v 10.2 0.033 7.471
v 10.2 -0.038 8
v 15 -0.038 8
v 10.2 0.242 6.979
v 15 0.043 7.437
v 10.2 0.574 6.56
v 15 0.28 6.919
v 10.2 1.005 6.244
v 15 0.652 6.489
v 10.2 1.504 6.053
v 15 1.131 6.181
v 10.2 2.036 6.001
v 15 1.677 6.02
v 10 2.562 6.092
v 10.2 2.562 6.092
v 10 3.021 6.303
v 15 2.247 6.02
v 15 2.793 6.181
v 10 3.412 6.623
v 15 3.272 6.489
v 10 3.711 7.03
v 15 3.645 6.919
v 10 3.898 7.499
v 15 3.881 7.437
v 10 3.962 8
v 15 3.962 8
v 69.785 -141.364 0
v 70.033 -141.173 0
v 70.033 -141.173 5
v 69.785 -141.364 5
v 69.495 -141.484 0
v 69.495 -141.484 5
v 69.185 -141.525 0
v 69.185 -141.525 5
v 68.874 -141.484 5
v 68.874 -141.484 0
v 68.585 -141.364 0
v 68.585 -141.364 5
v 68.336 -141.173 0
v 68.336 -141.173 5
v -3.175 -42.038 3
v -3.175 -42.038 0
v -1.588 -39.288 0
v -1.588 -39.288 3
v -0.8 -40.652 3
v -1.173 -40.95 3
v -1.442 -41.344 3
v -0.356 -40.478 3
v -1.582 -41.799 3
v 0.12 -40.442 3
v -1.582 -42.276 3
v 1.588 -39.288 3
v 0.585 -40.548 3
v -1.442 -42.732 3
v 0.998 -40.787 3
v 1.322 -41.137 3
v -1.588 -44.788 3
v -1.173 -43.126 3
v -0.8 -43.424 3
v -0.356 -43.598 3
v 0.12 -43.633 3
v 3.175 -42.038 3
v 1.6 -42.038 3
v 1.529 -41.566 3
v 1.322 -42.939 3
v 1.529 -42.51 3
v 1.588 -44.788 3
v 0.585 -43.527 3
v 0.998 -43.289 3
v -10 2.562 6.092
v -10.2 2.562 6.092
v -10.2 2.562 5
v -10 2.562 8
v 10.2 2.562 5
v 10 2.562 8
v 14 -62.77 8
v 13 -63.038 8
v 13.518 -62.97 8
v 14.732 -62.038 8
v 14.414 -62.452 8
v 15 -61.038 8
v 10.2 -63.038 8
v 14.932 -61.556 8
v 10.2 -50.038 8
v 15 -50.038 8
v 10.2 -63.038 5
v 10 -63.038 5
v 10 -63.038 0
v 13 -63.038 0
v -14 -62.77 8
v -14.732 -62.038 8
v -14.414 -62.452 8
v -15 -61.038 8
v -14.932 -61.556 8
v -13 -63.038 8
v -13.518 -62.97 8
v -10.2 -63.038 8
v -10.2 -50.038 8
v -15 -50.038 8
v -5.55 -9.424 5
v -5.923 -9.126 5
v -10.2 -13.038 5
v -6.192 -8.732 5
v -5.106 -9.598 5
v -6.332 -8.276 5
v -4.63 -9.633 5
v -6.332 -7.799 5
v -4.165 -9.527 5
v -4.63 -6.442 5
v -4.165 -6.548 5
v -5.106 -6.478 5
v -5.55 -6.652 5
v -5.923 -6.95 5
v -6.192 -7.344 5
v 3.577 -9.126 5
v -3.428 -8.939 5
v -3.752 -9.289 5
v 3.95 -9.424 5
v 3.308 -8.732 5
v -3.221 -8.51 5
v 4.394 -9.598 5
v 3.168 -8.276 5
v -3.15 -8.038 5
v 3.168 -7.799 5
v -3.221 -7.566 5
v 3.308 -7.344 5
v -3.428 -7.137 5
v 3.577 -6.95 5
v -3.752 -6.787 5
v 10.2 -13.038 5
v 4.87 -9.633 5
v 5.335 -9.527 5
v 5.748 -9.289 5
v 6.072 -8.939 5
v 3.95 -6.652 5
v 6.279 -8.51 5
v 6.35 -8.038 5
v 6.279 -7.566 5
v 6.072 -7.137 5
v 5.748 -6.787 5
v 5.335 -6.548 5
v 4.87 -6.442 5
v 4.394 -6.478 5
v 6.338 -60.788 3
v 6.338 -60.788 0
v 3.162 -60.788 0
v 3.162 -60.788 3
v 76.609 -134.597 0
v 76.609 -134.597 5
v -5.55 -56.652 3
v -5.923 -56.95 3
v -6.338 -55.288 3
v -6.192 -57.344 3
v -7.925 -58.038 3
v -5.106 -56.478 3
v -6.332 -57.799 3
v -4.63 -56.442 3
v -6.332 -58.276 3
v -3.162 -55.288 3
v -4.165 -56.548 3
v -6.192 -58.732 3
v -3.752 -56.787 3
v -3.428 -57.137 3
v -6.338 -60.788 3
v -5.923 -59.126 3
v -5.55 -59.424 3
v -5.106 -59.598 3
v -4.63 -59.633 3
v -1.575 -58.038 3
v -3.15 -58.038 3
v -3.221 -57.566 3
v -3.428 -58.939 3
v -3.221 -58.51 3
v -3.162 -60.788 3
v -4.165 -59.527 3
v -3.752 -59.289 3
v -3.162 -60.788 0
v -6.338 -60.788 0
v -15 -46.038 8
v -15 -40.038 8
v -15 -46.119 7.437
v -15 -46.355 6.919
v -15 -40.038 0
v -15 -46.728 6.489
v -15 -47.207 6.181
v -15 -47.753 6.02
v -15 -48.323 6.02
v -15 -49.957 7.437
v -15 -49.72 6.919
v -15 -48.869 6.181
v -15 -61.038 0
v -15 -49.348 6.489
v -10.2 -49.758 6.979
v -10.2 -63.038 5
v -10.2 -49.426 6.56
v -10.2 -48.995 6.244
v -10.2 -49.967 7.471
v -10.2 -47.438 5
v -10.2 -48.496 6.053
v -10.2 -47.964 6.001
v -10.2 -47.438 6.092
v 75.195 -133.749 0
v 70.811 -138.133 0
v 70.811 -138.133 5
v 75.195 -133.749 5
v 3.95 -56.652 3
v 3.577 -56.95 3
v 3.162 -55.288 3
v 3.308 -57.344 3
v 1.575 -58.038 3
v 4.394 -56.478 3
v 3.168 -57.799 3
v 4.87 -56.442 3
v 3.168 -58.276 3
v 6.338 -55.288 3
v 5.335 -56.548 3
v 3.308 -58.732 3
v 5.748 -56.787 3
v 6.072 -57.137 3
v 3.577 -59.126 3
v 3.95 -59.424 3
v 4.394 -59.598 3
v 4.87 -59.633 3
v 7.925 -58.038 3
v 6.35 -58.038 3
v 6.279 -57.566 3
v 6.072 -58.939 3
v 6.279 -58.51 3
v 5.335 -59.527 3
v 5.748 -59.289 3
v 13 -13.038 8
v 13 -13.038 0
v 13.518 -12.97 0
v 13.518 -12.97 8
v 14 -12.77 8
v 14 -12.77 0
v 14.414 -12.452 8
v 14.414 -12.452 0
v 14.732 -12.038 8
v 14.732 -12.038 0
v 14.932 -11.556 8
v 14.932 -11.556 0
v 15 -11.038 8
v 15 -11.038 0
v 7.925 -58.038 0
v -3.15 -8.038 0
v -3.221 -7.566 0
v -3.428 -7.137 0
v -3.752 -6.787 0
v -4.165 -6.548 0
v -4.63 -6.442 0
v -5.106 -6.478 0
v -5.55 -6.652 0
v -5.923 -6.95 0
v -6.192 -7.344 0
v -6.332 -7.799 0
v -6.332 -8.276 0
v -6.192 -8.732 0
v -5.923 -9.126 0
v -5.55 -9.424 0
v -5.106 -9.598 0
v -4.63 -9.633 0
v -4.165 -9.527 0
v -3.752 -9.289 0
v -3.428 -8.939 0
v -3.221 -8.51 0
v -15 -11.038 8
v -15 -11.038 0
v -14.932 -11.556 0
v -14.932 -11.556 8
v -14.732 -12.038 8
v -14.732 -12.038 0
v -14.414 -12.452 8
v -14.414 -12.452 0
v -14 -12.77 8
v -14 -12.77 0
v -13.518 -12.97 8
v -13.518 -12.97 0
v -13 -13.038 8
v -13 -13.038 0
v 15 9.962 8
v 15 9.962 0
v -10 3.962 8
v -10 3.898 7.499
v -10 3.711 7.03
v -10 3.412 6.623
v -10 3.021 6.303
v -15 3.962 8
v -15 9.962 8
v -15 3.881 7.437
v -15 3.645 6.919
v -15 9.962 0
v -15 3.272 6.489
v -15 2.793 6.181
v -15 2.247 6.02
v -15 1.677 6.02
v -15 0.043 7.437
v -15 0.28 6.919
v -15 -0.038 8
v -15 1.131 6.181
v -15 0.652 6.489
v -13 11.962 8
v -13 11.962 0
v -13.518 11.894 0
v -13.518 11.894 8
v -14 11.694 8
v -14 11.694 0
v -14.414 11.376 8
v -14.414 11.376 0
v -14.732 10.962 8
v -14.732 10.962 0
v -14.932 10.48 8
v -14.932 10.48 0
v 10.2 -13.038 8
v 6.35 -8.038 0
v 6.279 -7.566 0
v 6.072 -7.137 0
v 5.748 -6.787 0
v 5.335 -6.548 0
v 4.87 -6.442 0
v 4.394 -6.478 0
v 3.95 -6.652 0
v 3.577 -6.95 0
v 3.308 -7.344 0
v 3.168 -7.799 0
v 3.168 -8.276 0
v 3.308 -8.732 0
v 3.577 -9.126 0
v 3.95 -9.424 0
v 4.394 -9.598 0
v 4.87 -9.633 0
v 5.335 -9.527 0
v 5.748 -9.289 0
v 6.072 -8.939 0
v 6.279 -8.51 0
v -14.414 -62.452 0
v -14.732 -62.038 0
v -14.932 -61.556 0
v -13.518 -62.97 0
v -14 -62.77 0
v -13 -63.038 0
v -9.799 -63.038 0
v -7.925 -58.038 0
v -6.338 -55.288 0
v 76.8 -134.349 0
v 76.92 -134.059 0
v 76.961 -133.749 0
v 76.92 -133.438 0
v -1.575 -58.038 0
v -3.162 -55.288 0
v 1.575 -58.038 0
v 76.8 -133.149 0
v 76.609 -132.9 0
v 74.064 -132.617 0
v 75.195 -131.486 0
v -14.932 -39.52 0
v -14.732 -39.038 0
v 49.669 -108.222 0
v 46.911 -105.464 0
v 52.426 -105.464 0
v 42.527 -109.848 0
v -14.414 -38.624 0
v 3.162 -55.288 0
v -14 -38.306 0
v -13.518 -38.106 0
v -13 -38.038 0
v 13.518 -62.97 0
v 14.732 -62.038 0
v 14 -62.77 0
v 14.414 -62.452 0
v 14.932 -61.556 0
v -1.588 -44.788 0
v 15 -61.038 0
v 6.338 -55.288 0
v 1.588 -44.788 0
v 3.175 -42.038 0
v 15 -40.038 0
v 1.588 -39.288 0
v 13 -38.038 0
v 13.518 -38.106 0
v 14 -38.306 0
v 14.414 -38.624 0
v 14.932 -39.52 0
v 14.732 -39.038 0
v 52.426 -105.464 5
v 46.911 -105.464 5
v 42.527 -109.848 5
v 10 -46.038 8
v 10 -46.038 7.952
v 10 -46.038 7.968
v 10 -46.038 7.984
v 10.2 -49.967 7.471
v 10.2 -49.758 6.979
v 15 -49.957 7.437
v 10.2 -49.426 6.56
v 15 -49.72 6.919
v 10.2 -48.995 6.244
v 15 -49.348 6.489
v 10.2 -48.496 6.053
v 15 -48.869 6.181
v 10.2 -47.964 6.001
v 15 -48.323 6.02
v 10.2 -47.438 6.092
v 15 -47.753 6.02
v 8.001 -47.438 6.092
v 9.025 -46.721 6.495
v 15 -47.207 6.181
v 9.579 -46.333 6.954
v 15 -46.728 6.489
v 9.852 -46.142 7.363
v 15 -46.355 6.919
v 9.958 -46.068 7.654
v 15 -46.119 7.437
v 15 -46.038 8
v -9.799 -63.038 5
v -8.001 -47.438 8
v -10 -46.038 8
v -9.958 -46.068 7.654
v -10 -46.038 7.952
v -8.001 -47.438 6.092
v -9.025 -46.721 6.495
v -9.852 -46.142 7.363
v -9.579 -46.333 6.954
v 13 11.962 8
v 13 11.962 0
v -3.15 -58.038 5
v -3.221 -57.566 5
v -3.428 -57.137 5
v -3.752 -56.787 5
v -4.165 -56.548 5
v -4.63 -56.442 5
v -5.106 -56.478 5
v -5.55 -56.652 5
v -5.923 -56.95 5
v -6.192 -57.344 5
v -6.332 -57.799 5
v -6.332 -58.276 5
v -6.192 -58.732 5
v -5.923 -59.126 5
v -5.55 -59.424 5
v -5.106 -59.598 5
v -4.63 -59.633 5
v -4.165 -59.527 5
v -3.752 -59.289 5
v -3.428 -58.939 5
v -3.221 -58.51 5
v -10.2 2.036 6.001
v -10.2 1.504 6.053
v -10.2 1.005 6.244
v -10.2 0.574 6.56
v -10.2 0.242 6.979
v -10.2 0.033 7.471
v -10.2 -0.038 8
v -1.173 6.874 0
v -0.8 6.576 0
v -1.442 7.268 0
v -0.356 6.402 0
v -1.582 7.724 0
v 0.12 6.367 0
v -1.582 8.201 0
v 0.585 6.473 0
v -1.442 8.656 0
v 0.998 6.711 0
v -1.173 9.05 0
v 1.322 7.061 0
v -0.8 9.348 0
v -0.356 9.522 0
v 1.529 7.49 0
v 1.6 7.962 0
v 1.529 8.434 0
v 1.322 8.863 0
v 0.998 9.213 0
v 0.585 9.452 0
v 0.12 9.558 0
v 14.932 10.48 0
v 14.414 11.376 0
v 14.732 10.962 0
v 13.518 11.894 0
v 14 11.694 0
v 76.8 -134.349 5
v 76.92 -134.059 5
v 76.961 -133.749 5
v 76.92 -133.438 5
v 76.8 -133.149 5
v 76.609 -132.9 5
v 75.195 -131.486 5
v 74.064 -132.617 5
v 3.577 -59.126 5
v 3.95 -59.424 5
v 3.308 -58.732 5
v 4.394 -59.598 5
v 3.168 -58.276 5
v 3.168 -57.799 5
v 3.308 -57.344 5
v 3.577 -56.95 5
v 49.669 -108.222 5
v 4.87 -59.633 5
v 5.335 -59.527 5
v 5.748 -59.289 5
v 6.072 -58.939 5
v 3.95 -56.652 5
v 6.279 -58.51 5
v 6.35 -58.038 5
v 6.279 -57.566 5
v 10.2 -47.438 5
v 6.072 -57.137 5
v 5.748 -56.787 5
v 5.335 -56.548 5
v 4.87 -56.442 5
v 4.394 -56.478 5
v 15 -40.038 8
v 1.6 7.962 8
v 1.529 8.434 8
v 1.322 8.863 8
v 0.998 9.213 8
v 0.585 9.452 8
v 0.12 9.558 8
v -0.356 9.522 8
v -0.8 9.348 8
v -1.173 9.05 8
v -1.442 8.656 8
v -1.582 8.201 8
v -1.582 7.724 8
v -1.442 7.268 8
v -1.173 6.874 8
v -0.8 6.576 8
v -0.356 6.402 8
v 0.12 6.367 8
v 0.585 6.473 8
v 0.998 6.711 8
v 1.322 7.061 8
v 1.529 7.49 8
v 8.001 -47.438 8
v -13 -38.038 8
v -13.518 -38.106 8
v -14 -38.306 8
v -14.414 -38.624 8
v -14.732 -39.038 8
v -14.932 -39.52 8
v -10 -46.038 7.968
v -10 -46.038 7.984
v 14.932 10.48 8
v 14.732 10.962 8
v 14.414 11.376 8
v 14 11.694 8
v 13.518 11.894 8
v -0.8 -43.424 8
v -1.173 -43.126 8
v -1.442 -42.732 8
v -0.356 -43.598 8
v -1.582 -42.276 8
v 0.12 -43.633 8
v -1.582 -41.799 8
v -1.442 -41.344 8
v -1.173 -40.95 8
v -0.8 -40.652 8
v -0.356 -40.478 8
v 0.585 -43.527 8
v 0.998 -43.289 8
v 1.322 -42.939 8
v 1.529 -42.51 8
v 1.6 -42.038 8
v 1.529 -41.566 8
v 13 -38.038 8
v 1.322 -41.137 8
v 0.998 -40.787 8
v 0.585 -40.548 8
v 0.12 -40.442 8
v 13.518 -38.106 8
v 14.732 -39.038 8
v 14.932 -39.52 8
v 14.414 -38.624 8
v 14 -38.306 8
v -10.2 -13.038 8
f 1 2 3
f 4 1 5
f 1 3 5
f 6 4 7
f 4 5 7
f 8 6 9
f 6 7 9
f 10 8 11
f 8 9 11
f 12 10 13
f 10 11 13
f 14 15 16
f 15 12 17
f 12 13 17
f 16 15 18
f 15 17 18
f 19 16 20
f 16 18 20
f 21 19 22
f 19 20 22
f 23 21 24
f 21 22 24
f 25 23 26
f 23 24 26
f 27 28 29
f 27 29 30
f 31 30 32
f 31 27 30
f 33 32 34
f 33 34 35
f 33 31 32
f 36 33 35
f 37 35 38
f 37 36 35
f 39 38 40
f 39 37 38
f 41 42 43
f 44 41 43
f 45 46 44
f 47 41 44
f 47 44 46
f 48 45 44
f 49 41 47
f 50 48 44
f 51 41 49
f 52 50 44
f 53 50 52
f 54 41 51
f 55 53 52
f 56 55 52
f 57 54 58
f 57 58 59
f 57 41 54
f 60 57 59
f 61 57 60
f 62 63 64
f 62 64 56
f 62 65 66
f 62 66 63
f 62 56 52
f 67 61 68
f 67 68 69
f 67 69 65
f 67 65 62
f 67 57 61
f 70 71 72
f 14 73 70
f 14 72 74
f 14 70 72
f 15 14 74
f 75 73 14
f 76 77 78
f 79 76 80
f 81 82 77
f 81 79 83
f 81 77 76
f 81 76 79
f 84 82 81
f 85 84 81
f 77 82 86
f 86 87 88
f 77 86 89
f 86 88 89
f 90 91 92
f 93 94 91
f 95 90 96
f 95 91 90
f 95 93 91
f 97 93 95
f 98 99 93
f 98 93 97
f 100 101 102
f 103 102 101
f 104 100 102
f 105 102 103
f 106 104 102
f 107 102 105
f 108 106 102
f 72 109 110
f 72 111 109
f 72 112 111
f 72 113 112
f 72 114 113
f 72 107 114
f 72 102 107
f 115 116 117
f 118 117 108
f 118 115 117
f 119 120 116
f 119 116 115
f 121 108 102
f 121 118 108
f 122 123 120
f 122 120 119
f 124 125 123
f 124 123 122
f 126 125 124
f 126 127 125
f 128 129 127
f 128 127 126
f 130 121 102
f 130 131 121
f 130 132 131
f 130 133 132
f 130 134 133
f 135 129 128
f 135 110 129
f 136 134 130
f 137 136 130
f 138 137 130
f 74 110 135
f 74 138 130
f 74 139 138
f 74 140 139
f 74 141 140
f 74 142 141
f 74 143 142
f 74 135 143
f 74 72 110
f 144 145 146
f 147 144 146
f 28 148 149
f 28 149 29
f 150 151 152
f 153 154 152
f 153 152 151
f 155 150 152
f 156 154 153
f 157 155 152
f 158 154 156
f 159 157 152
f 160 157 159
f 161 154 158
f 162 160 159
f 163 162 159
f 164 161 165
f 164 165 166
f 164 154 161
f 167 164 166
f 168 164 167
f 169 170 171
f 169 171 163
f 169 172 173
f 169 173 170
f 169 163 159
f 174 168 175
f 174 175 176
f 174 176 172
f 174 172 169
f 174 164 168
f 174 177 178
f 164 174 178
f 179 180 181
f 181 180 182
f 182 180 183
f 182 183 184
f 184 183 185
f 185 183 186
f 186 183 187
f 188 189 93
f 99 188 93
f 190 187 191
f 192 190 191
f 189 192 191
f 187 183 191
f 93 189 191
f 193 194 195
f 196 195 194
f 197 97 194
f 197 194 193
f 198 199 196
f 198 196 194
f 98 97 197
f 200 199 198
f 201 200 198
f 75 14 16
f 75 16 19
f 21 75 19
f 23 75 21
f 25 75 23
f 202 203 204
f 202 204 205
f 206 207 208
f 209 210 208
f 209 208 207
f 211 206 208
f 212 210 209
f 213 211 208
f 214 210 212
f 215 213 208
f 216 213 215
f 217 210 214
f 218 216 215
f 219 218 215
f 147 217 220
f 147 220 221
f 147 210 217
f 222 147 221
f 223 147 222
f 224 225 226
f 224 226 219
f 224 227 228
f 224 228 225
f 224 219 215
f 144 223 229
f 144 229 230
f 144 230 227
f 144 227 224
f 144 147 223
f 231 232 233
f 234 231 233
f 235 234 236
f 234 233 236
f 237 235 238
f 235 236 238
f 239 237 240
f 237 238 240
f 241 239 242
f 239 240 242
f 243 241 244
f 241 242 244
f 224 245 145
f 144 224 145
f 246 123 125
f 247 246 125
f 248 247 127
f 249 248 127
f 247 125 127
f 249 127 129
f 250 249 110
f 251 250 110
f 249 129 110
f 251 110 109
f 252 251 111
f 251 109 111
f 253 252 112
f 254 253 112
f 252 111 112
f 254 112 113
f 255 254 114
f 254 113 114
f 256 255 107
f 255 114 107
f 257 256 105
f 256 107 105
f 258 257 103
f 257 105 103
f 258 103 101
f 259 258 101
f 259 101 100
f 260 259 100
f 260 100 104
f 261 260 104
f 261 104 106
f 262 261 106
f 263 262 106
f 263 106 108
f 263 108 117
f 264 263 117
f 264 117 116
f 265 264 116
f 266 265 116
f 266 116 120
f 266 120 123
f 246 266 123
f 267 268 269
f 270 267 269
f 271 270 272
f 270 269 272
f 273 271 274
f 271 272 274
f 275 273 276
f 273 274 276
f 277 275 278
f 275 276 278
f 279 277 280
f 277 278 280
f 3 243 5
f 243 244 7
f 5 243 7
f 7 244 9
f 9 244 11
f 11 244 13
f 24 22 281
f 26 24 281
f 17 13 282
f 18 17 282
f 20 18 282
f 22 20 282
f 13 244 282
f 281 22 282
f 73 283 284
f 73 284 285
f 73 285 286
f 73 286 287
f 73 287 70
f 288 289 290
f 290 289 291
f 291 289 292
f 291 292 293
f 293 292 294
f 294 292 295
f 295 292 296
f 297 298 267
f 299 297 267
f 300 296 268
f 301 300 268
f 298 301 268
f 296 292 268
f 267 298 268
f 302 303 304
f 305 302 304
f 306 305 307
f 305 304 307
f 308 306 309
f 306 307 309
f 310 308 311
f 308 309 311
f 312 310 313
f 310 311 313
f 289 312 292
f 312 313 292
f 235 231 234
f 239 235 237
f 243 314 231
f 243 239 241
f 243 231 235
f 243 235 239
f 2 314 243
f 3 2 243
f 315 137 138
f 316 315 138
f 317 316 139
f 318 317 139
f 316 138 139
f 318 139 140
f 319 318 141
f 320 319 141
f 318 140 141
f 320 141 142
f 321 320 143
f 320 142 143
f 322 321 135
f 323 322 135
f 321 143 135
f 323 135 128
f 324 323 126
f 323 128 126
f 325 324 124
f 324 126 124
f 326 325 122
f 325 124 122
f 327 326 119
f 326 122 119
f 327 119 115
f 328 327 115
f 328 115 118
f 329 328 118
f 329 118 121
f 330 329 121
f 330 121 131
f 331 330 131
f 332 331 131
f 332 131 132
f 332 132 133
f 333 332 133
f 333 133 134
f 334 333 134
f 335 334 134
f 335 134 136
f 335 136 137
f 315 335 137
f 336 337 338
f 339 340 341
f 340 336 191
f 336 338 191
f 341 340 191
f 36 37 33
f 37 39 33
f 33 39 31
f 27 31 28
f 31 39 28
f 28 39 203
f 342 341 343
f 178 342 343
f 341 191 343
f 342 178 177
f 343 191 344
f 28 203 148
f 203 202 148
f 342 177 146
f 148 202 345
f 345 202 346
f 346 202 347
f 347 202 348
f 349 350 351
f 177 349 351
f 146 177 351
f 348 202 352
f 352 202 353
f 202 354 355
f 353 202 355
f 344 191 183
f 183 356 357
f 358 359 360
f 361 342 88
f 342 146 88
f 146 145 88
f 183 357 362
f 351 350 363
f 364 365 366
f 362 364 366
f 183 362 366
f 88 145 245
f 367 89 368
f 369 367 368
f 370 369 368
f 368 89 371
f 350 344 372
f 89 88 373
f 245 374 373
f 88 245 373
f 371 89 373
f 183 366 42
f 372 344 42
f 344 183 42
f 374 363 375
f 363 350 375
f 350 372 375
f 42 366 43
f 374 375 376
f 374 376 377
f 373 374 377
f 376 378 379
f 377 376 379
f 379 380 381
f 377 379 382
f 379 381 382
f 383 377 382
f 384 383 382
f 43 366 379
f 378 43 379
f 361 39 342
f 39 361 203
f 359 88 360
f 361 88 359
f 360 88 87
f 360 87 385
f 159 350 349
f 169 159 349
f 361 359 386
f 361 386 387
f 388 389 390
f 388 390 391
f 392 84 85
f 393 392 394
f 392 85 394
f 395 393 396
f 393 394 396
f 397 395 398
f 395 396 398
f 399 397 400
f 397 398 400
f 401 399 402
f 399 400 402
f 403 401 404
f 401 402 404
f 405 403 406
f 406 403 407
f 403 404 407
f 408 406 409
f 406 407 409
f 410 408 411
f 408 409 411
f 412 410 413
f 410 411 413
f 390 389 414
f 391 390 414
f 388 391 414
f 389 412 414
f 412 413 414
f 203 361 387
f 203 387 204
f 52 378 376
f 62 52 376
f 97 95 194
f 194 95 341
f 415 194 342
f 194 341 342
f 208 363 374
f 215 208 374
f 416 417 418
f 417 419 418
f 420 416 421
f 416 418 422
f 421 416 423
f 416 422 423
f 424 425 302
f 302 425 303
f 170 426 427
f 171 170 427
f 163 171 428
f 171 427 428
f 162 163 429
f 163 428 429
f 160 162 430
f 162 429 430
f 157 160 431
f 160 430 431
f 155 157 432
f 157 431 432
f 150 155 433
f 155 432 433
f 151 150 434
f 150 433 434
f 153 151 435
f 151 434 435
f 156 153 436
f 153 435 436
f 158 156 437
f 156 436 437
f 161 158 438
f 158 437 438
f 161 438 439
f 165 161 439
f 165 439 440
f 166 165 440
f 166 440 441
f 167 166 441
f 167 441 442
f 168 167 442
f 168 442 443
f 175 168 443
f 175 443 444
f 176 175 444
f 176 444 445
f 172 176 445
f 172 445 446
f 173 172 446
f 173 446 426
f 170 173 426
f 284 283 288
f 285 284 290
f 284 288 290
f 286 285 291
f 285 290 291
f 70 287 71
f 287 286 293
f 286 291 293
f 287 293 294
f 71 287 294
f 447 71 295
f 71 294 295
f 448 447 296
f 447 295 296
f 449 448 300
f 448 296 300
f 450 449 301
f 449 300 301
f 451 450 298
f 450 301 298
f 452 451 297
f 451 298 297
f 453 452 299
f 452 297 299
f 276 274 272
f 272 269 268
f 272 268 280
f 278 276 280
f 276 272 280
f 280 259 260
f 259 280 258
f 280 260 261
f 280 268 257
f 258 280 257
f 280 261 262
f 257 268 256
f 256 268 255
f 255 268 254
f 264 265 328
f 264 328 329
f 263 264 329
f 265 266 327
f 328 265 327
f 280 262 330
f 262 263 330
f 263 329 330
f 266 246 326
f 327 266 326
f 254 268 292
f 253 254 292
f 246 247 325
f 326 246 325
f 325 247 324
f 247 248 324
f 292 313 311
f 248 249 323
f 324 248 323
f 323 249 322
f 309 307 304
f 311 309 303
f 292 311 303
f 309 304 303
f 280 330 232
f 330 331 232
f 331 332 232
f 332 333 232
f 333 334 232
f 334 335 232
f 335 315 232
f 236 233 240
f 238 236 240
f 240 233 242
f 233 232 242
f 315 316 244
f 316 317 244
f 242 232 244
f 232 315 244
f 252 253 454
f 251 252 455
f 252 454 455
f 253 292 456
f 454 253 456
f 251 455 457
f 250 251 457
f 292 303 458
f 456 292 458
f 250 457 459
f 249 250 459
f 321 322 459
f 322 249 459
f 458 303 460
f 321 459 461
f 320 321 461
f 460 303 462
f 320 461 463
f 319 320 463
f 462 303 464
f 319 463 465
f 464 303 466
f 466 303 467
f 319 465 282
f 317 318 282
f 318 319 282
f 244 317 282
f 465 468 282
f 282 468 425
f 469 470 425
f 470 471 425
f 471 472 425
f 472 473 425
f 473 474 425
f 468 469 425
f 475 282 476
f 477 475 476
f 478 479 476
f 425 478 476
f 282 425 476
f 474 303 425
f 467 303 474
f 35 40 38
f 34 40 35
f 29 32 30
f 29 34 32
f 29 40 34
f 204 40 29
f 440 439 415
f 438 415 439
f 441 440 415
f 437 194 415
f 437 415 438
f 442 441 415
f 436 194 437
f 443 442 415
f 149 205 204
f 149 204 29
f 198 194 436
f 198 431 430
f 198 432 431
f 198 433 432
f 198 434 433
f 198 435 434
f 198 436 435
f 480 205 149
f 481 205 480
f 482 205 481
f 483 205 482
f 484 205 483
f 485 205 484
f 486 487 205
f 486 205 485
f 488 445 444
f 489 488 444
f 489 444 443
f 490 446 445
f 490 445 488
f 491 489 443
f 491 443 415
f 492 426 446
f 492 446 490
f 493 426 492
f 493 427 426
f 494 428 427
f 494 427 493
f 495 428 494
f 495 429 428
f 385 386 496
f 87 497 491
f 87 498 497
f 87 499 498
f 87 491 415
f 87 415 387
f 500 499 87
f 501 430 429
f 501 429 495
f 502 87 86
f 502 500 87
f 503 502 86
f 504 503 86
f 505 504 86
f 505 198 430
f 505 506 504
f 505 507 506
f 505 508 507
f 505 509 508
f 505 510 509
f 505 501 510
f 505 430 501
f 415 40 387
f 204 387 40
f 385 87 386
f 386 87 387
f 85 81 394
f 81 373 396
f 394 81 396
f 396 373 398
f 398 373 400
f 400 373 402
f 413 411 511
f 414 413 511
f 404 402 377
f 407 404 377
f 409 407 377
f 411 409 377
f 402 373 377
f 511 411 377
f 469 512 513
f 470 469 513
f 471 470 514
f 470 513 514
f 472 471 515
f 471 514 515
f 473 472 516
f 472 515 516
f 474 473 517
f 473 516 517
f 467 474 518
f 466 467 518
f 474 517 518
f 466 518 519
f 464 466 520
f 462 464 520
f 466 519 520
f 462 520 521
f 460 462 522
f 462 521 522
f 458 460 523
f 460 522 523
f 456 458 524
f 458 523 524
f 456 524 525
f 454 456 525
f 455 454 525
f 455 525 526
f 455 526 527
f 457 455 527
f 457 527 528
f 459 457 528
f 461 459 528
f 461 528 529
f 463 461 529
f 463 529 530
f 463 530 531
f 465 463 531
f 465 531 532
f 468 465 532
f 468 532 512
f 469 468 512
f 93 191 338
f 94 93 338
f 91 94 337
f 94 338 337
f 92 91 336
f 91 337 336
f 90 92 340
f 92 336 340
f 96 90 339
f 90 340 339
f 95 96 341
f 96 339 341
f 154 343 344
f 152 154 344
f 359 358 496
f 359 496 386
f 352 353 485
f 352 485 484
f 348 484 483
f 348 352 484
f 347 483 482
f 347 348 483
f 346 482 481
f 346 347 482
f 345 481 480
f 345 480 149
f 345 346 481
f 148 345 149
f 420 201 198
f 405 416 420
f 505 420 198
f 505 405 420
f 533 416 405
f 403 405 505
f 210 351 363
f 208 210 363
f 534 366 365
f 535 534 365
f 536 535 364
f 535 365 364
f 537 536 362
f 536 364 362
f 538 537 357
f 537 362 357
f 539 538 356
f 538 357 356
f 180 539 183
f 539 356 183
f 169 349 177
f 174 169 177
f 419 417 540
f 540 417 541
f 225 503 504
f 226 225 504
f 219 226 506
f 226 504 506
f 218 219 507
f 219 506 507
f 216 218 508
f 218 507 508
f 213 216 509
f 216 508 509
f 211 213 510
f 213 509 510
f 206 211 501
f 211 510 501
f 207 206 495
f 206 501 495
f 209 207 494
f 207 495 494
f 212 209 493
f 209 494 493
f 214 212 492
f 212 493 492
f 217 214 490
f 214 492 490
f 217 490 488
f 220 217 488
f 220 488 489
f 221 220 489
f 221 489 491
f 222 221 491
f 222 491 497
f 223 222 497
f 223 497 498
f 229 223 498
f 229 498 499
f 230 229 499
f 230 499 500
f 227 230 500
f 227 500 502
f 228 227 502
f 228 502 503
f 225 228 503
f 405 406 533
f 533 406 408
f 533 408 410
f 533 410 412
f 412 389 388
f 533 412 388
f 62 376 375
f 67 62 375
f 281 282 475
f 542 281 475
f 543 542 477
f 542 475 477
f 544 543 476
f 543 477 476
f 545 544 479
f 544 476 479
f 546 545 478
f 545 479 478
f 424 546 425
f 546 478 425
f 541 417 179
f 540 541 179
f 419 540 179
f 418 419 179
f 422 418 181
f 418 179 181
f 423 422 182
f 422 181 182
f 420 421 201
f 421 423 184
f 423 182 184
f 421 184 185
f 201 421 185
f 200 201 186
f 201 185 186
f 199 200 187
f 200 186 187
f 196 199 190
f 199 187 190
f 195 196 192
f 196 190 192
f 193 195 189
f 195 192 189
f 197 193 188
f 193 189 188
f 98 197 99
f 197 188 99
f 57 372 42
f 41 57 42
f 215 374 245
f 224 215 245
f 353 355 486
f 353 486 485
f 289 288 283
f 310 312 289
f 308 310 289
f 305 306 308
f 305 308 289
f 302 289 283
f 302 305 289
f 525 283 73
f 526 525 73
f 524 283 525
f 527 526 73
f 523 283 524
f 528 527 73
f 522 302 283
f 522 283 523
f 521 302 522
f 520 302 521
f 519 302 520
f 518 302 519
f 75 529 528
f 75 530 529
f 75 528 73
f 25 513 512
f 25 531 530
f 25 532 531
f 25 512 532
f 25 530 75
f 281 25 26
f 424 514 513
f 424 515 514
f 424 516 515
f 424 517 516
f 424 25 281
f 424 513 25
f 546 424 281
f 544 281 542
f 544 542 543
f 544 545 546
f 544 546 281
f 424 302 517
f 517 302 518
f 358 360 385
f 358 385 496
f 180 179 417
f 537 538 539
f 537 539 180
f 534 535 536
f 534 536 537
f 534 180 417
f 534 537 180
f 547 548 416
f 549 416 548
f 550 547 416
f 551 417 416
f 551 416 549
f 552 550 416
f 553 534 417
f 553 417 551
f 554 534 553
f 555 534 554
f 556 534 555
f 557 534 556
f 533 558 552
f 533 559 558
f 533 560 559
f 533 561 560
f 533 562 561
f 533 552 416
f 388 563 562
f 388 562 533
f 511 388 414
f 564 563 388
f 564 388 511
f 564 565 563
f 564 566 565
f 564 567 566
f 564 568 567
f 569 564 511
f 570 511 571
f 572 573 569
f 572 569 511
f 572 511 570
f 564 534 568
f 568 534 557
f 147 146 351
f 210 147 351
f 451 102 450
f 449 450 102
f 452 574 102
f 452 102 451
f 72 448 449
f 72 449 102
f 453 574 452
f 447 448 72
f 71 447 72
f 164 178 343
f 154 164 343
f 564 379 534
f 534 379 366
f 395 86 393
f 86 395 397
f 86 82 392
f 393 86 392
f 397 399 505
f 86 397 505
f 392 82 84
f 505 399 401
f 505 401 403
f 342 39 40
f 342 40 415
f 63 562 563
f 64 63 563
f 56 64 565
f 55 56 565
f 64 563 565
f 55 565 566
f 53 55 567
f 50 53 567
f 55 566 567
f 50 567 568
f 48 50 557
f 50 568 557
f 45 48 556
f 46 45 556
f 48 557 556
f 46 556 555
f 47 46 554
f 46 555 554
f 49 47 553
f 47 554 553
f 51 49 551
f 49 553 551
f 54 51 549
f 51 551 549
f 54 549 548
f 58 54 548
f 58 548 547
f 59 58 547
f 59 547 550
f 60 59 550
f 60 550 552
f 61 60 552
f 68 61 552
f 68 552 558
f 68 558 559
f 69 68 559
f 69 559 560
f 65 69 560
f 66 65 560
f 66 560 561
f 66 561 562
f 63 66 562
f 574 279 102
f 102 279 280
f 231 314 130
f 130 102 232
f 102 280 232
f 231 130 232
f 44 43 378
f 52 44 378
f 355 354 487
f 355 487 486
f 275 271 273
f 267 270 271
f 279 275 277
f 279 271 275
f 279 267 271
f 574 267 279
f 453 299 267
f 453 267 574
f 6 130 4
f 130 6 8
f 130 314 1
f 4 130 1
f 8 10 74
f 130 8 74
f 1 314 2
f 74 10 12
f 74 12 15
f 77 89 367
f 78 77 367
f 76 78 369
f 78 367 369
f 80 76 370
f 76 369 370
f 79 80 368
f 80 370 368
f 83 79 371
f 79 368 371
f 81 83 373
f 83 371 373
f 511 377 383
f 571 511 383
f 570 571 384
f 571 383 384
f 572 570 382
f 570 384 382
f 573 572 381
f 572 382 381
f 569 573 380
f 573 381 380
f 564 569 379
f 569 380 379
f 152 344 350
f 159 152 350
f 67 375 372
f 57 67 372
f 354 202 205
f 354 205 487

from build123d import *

# Parameters (mm, degrees)
F1_DEPTH  = 8
F2_W      = 20.4
F2_H      = 15.6
F3_DEPTH  = 3
F4_R      = 2
F5_DEPTH  = 5
F6_R      = 2
F7_DEPTH  = 5
F8_R      = 1.6
F9_DEPTH  = 5.001
F10_R     = 1.6
F11_DEPTH = 8.001
F14_DEPTH = 3
F16_DEPTH = 5
F17_SIZE2 = 1.399415
F17_SIZE  = 1.999
F18_SIZE2 = 1.399415
F18_SIZE  = 1.999


# Not quite as in the source:
# - a fillet or chamfer is up to 0.001 mm smaller than in the source, because OpenCascade refuses the exact size


with BuildPart() as f1:
    # F0 (on Top) → F1 (new body)
    with BuildSketch(Plane.XY):
        with BuildLine():
            Line((13, 11.9621065401), (-13, 11.9621065401))
            ThreePointArc((-13, 11.9621065401), (-14.4142135624, 11.3763201025), (-15, 9.9621065401))
            Line((-15, 9.9621065401), (-15, -11.0378934599))
            ThreePointArc((-15, -11.0378934599), (-14.4142135624, -12.4521070223), (-13, -13.0378934599))
            Line((-13, -13.0378934599), (13, -13.0378934599))
            ThreePointArc((13, -13.0378934599), (14.4142135624, -12.4521070223), (15, -11.0378934599))
            Line((15, -11.0378934599), (15, 9.9621065401))
            ThreePointArc((15, 9.9621065401), (14.4142135624, 11.3763201025), (13, 11.9621065401))
        make_face()
    extrude(amount=F1_DEPTH)

    # F2 (on face) → F3 (cut)
    with BuildSketch(Plane.XY.offset(8)):
        with Locations((0, -5.2378934599)):
            Rectangle(F2_W, F2_H)
    extrude(amount=-F3_DEPTH, mode=Mode.SUBTRACT)

    # F4 (on face) → F5 (cut)
    with BuildSketch(Plane.YZ.offset(15)):
        with Locations((1.9621065401, 8)):
            Circle(F4_R)
    extrude(amount=-F5_DEPTH, mode=Mode.SUBTRACT)

    # F6 (on face) → F7 (cut)
    with BuildSketch(Plane(origin=(-15, 0, 0), x_dir=(0, -1, 0), z_dir=(-1, 0, 0))):
        with Locations((-1.9621065401, 8)):
            Circle(F6_R)
    extrude(amount=-F7_DEPTH, mode=Mode.SUBTRACT)

    # F8 (on face) → F9 (cut, through all)
    with BuildSketch(Plane.XY.offset(5)):
        with Locations((-4.75, -8.0378934599)):
            Circle(F8_R)
        with Locations((4.75, -8.0378934599)):
            Circle(F8_R)
    extrude(amount=-F9_DEPTH, mode=Mode.SUBTRACT)

    # F10 (on face) → F11 (cut, through all)
    with BuildSketch(Plane.XY.offset(8)):
        with Locations((0, 7.9621065401)):
            Circle(F10_R)
    extrude(amount=-F11_DEPTH, mode=Mode.SUBTRACT)


with BuildPart() as f12_1:
    # F12: copy of F1
    add(f1.part.moved(Location((0, -50, 0))))

    # F13 (on face) → F14 (cut)
    with BuildSketch(Plane(origin=(0, 0, 0), x_dir=(1, 0, 0), z_dir=(0, 0, -1))):
        Polygon((-3.1622867597, 55.2878934599), (-1.5745735195, 58.0378934599), (-3.1622867597, 60.7878934599), (-6.3377132403, 60.7878934599), (-7.9254264805, 58.0378934599), (-6.3377132403, 55.2878934599), align=None)
        Polygon((6.3377132403, 55.2878934599), (7.9254264805, 58.0378934599), (6.3377132403, 60.7878934599), (3.1622867597, 60.7878934599), (1.5745735195, 58.0378934599), (3.1622867597, 55.2878934599), align=None)
        Polygon((-1.5877132403, 39.2878934599), (1.5877132403, 39.2878934599), (3.1754264805, 42.0378934599), (1.5877132403, 44.7878934599), (-1.5877132403, 44.7878934599), (-3.1754264805, 42.0378934599), align=None)
    extrude(amount=-F14_DEPTH, mode=Mode.SUBTRACT)

    # F15 (on face) → F16 (join)
    with BuildSketch(Plane(origin=(0, 0, 0), x_dir=(1, 0, 0), z_dir=(0, 0, -1))):
        with BuildLine():
            Line((-9.7989898732, 63.0378934599), (10, 63.0378934599))
            Line((10, 63.0378934599), (52.4264068712, 105.4643003311))
            Line((52.4264068712, 105.4643003311), (49.6686904246, 108.2220167777))
            Line((49.6686904246, 108.2220167777), (46.9109739779, 105.4643003311))
            Line((46.9109739779, 105.4643003311), (42.5269119346, 109.8483623745))
            Line((42.5269119346, 109.8483623745), (70.811183182, 138.1326336219))
            Line((70.811183182, 138.1326336219), (75.1952452254, 133.7485715786))
            Line((75.1952452254, 133.7485715786), (74.0638743755, 132.6172007287))
            Line((74.0638743755, 132.6172007287), (75.1952452254, 131.4858298788))
            Line((75.1952452254, 131.4858298788), (76.6094587878, 132.9000434412))
            ThreePointArc((76.6094587878, 132.9000434412), (76.9609306503, 133.7485715786), (76.6094587878, 134.597099716))
            Line((76.6094587878, 134.597099716), (70.0333657227, 141.173192781))
            ThreePointArc((70.0333657227, 141.173192781), (69.1848375853, 141.5246646436), (68.3363094479, 141.173192781))
            Line((68.3363094479, 141.173192781), (-9.7989898732, 63.0378934599))
        make_face()
    extrude(amount=-F16_DEPTH)

    # F17 (size 2 and 1.4004150764 in the source; OpenCascade refuses exactly that, so slightly less here)
    f17_edges = [f12_1.edges().sort_by_distance(p)[0] for p in [
        (-10, -47.437893, 7.046061),
    ]]
    f17_side = f12_1.faces().sort_by_distance((0, -47.437893, 6.493105))[0]
    chamfer(f17_edges, length=F17_SIZE, length2=F17_SIZE2, reference=f17_side)

    # F18 (size 2 and 1.4004150764 in the source; OpenCascade refuses exactly that, so slightly less here)
    f18_edges = [f12_1.edges().sort_by_distance(p)[0] for p in [
        (10, -47.437893, 7.046061),
    ]]
    f18_side = f12_1.faces().sort_by_distance((0.60623, -47.437893, 6.45586))[0]
    chamfer(f18_edges, length=F18_SIZE, length2=F18_SIZE2, reference=f18_side)


solid = Compound([f1.part, f12_1.part])
